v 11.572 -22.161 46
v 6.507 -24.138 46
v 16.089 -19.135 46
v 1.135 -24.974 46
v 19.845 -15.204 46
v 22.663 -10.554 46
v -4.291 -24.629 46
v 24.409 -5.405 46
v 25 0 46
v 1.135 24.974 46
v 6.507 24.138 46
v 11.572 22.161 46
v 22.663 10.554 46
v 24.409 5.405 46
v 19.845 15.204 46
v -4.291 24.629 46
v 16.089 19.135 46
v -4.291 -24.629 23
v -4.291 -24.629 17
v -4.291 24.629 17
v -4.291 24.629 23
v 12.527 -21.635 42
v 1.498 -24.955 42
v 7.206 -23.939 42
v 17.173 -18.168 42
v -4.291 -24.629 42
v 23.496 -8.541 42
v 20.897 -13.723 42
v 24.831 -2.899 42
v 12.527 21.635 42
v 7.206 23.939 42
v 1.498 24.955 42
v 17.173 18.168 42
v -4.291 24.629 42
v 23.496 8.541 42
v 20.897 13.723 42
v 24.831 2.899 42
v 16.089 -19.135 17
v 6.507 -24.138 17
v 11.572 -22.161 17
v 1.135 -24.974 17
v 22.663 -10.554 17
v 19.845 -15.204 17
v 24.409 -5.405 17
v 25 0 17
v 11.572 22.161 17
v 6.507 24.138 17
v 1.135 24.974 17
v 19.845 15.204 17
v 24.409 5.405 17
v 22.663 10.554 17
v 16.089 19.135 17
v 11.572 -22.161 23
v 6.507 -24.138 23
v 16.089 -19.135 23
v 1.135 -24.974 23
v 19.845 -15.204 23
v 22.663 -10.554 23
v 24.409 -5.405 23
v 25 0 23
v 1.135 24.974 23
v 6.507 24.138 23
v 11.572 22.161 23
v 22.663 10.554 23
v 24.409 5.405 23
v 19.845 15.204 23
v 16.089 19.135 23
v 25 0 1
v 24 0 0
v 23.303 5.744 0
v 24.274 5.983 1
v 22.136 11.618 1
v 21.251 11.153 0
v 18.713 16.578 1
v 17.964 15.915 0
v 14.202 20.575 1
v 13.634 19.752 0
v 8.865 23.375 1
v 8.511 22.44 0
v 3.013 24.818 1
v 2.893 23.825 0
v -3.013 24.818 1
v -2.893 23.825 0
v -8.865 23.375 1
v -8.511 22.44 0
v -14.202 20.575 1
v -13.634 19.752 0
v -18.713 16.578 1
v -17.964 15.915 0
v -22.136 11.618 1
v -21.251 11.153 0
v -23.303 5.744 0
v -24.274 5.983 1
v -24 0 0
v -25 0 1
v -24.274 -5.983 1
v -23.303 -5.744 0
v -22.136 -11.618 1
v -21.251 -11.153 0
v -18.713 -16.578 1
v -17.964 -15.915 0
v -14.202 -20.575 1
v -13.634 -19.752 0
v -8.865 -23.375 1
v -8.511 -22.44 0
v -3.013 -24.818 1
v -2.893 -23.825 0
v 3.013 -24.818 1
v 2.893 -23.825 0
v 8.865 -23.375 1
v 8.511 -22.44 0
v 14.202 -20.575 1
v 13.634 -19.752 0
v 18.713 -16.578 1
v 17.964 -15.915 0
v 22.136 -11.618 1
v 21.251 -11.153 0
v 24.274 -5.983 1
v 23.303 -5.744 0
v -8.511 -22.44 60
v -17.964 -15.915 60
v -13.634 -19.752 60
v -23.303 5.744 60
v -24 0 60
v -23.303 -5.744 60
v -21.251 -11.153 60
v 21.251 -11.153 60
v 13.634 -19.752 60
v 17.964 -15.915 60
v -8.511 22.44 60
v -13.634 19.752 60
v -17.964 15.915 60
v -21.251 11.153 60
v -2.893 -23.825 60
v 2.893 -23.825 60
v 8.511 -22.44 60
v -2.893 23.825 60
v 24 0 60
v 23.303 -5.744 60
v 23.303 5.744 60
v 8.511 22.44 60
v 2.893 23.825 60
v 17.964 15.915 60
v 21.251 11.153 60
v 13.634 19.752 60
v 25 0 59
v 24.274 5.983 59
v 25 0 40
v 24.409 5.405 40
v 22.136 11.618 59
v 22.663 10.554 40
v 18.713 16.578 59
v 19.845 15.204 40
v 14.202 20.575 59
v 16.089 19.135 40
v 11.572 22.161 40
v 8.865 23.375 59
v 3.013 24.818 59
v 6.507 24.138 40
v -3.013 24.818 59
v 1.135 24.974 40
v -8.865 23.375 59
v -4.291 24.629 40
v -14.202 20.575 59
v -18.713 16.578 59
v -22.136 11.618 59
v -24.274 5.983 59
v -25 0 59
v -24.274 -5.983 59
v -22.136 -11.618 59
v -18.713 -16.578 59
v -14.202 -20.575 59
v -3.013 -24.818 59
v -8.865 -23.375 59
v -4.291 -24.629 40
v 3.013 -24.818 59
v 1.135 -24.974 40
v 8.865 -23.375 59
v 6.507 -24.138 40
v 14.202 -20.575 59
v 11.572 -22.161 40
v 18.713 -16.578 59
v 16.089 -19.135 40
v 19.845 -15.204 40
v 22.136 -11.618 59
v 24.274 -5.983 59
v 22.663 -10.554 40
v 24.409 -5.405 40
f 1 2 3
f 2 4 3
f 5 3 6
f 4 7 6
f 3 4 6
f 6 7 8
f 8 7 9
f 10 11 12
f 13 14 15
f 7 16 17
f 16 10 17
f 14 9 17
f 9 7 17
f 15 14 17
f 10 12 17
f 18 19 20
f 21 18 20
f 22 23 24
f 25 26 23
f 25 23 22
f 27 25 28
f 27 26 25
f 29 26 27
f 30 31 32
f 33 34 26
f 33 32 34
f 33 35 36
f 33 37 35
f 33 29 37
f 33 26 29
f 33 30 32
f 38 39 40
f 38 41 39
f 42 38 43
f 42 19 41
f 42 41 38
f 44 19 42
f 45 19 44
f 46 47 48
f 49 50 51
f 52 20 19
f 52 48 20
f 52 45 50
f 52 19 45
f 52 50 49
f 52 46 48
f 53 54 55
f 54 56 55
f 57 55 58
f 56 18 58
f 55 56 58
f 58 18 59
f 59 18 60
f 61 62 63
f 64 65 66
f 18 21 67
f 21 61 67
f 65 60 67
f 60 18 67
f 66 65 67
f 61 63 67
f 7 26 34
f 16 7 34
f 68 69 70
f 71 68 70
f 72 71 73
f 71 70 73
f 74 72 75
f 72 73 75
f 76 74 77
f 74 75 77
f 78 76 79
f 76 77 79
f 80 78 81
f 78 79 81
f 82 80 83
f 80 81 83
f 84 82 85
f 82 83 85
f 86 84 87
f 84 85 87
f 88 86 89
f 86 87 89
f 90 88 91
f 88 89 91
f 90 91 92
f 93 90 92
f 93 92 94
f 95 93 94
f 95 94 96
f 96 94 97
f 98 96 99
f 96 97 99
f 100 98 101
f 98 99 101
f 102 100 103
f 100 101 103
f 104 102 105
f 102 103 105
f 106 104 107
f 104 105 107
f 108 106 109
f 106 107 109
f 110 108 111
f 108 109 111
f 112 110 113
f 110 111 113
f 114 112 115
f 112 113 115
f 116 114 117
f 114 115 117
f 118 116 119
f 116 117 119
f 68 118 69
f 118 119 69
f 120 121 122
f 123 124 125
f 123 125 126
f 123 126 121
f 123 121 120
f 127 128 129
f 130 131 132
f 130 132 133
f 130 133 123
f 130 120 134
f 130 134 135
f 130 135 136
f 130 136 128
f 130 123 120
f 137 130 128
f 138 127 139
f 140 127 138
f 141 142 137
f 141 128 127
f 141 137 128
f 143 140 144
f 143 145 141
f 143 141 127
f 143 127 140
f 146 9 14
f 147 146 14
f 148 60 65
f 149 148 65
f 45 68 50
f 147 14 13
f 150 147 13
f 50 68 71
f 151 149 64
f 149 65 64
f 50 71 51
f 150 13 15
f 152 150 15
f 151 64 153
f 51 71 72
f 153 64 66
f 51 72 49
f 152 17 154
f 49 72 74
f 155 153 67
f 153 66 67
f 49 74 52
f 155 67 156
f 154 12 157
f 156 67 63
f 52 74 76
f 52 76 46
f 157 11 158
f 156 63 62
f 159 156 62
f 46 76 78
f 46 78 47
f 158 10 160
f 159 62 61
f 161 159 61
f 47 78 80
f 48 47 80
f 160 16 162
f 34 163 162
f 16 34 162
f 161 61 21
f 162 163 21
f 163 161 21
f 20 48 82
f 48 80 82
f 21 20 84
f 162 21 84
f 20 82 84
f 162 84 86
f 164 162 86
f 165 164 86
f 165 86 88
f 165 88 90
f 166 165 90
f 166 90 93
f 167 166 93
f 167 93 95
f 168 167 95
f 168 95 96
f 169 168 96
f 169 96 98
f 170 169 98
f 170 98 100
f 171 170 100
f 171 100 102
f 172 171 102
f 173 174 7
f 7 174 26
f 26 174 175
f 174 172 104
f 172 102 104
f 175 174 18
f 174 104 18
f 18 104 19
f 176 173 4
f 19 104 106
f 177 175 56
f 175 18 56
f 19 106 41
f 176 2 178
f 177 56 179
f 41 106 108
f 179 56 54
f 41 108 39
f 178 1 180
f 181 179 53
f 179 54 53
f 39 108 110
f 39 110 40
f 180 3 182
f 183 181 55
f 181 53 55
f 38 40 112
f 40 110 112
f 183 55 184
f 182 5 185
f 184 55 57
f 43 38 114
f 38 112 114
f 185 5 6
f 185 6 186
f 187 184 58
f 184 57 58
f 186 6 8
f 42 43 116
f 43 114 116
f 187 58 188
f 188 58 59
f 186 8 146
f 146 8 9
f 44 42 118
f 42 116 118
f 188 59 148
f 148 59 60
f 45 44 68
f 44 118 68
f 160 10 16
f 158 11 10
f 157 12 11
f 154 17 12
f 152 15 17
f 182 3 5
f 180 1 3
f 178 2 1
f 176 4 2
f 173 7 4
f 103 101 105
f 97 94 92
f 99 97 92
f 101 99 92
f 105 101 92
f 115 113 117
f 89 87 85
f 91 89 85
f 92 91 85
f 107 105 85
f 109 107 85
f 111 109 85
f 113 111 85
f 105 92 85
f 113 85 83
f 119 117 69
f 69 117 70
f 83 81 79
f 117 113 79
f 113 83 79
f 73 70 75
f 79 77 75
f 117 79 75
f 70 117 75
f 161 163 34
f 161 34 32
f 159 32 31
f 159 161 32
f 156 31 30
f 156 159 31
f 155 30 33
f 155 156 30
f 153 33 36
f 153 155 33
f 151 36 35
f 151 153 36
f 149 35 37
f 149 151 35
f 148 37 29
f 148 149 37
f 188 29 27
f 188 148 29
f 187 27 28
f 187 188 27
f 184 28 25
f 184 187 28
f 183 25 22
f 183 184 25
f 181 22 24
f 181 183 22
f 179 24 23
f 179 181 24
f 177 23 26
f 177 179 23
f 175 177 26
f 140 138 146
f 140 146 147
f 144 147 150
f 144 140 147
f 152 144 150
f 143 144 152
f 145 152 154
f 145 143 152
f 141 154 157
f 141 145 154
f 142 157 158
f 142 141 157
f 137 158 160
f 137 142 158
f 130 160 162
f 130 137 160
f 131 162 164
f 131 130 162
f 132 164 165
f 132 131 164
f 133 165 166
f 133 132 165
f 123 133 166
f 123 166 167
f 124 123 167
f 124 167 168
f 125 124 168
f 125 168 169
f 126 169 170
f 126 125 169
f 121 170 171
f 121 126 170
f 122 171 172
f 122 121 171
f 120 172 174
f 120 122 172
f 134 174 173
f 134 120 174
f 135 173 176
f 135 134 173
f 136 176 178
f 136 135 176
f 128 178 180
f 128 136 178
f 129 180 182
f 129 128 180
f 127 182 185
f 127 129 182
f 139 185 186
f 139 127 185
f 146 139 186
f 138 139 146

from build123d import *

# Parameters (mm, degrees)
F0_R      = 25
F1_DEPTH  = 60
F2_W      = 61.5676790476
F2_H      = 184.1998919845
F3_DEPTH  = 6
F10_SIZE  = 1
F11_SIZE  = 1
F12_DEPTH = 2


with BuildPart() as f1:
    # F0 (on Top) → F1 (new body)
    with BuildSketch(Plane.XY):
        Circle(F0_R)
    extrude(amount=F1_DEPTH)


with BuildPart() as f3:
    # F2 (on Top) → F3 (new body)
    with BuildSketch(Plane.XY):
        with Locations((-161.507062614, 31.8613536656)):
            Rectangle(F2_W, F2_H)
    extrude(amount=F3_DEPTH)


with BuildPart() as f4_1:
    # F4: copy of F3
    add(f3.part.moved(Location((188, 0, 17))))


with BuildPart() as f5_1:
    # F5: copy of F4_1
    add(f4_1.part.moved(Location((0, 0, 17))))


with BuildPart() as f7_1:
    # F7: copy of F4_1
    add(f4_1.part.moved(Location((0, 0, 23))))


with BuildPart() as f1_1:
    add(f1.part)

    # F8: cut F4_1, F7_1
    add(f4_1.part, mode=Mode.SUBTRACT)
    add(f7_1.part, mode=Mode.SUBTRACT)

    # F10
    f10_edges = [f1_1.edges().sort_by_distance(p)[0] for p in [
        (-25, 0, 60),
    ]]
    chamfer(f10_edges, length=F10_SIZE)

    # F11
    f11_edges = [f1_1.edges().sort_by_distance(p)[0] for p in [
        (-25, 0, 0),
    ]]
    chamfer(f11_edges, length=F11_SIZE)

    # F12 (add): a face of the model
    f12_faces = [f1_1.faces().sort_by_distance(p)[0] for p in [
        (8.3329049889, 0, 40),
    ]]
    extrude(f12_faces, amount=F12_DEPTH)


solid = f1_1.part
